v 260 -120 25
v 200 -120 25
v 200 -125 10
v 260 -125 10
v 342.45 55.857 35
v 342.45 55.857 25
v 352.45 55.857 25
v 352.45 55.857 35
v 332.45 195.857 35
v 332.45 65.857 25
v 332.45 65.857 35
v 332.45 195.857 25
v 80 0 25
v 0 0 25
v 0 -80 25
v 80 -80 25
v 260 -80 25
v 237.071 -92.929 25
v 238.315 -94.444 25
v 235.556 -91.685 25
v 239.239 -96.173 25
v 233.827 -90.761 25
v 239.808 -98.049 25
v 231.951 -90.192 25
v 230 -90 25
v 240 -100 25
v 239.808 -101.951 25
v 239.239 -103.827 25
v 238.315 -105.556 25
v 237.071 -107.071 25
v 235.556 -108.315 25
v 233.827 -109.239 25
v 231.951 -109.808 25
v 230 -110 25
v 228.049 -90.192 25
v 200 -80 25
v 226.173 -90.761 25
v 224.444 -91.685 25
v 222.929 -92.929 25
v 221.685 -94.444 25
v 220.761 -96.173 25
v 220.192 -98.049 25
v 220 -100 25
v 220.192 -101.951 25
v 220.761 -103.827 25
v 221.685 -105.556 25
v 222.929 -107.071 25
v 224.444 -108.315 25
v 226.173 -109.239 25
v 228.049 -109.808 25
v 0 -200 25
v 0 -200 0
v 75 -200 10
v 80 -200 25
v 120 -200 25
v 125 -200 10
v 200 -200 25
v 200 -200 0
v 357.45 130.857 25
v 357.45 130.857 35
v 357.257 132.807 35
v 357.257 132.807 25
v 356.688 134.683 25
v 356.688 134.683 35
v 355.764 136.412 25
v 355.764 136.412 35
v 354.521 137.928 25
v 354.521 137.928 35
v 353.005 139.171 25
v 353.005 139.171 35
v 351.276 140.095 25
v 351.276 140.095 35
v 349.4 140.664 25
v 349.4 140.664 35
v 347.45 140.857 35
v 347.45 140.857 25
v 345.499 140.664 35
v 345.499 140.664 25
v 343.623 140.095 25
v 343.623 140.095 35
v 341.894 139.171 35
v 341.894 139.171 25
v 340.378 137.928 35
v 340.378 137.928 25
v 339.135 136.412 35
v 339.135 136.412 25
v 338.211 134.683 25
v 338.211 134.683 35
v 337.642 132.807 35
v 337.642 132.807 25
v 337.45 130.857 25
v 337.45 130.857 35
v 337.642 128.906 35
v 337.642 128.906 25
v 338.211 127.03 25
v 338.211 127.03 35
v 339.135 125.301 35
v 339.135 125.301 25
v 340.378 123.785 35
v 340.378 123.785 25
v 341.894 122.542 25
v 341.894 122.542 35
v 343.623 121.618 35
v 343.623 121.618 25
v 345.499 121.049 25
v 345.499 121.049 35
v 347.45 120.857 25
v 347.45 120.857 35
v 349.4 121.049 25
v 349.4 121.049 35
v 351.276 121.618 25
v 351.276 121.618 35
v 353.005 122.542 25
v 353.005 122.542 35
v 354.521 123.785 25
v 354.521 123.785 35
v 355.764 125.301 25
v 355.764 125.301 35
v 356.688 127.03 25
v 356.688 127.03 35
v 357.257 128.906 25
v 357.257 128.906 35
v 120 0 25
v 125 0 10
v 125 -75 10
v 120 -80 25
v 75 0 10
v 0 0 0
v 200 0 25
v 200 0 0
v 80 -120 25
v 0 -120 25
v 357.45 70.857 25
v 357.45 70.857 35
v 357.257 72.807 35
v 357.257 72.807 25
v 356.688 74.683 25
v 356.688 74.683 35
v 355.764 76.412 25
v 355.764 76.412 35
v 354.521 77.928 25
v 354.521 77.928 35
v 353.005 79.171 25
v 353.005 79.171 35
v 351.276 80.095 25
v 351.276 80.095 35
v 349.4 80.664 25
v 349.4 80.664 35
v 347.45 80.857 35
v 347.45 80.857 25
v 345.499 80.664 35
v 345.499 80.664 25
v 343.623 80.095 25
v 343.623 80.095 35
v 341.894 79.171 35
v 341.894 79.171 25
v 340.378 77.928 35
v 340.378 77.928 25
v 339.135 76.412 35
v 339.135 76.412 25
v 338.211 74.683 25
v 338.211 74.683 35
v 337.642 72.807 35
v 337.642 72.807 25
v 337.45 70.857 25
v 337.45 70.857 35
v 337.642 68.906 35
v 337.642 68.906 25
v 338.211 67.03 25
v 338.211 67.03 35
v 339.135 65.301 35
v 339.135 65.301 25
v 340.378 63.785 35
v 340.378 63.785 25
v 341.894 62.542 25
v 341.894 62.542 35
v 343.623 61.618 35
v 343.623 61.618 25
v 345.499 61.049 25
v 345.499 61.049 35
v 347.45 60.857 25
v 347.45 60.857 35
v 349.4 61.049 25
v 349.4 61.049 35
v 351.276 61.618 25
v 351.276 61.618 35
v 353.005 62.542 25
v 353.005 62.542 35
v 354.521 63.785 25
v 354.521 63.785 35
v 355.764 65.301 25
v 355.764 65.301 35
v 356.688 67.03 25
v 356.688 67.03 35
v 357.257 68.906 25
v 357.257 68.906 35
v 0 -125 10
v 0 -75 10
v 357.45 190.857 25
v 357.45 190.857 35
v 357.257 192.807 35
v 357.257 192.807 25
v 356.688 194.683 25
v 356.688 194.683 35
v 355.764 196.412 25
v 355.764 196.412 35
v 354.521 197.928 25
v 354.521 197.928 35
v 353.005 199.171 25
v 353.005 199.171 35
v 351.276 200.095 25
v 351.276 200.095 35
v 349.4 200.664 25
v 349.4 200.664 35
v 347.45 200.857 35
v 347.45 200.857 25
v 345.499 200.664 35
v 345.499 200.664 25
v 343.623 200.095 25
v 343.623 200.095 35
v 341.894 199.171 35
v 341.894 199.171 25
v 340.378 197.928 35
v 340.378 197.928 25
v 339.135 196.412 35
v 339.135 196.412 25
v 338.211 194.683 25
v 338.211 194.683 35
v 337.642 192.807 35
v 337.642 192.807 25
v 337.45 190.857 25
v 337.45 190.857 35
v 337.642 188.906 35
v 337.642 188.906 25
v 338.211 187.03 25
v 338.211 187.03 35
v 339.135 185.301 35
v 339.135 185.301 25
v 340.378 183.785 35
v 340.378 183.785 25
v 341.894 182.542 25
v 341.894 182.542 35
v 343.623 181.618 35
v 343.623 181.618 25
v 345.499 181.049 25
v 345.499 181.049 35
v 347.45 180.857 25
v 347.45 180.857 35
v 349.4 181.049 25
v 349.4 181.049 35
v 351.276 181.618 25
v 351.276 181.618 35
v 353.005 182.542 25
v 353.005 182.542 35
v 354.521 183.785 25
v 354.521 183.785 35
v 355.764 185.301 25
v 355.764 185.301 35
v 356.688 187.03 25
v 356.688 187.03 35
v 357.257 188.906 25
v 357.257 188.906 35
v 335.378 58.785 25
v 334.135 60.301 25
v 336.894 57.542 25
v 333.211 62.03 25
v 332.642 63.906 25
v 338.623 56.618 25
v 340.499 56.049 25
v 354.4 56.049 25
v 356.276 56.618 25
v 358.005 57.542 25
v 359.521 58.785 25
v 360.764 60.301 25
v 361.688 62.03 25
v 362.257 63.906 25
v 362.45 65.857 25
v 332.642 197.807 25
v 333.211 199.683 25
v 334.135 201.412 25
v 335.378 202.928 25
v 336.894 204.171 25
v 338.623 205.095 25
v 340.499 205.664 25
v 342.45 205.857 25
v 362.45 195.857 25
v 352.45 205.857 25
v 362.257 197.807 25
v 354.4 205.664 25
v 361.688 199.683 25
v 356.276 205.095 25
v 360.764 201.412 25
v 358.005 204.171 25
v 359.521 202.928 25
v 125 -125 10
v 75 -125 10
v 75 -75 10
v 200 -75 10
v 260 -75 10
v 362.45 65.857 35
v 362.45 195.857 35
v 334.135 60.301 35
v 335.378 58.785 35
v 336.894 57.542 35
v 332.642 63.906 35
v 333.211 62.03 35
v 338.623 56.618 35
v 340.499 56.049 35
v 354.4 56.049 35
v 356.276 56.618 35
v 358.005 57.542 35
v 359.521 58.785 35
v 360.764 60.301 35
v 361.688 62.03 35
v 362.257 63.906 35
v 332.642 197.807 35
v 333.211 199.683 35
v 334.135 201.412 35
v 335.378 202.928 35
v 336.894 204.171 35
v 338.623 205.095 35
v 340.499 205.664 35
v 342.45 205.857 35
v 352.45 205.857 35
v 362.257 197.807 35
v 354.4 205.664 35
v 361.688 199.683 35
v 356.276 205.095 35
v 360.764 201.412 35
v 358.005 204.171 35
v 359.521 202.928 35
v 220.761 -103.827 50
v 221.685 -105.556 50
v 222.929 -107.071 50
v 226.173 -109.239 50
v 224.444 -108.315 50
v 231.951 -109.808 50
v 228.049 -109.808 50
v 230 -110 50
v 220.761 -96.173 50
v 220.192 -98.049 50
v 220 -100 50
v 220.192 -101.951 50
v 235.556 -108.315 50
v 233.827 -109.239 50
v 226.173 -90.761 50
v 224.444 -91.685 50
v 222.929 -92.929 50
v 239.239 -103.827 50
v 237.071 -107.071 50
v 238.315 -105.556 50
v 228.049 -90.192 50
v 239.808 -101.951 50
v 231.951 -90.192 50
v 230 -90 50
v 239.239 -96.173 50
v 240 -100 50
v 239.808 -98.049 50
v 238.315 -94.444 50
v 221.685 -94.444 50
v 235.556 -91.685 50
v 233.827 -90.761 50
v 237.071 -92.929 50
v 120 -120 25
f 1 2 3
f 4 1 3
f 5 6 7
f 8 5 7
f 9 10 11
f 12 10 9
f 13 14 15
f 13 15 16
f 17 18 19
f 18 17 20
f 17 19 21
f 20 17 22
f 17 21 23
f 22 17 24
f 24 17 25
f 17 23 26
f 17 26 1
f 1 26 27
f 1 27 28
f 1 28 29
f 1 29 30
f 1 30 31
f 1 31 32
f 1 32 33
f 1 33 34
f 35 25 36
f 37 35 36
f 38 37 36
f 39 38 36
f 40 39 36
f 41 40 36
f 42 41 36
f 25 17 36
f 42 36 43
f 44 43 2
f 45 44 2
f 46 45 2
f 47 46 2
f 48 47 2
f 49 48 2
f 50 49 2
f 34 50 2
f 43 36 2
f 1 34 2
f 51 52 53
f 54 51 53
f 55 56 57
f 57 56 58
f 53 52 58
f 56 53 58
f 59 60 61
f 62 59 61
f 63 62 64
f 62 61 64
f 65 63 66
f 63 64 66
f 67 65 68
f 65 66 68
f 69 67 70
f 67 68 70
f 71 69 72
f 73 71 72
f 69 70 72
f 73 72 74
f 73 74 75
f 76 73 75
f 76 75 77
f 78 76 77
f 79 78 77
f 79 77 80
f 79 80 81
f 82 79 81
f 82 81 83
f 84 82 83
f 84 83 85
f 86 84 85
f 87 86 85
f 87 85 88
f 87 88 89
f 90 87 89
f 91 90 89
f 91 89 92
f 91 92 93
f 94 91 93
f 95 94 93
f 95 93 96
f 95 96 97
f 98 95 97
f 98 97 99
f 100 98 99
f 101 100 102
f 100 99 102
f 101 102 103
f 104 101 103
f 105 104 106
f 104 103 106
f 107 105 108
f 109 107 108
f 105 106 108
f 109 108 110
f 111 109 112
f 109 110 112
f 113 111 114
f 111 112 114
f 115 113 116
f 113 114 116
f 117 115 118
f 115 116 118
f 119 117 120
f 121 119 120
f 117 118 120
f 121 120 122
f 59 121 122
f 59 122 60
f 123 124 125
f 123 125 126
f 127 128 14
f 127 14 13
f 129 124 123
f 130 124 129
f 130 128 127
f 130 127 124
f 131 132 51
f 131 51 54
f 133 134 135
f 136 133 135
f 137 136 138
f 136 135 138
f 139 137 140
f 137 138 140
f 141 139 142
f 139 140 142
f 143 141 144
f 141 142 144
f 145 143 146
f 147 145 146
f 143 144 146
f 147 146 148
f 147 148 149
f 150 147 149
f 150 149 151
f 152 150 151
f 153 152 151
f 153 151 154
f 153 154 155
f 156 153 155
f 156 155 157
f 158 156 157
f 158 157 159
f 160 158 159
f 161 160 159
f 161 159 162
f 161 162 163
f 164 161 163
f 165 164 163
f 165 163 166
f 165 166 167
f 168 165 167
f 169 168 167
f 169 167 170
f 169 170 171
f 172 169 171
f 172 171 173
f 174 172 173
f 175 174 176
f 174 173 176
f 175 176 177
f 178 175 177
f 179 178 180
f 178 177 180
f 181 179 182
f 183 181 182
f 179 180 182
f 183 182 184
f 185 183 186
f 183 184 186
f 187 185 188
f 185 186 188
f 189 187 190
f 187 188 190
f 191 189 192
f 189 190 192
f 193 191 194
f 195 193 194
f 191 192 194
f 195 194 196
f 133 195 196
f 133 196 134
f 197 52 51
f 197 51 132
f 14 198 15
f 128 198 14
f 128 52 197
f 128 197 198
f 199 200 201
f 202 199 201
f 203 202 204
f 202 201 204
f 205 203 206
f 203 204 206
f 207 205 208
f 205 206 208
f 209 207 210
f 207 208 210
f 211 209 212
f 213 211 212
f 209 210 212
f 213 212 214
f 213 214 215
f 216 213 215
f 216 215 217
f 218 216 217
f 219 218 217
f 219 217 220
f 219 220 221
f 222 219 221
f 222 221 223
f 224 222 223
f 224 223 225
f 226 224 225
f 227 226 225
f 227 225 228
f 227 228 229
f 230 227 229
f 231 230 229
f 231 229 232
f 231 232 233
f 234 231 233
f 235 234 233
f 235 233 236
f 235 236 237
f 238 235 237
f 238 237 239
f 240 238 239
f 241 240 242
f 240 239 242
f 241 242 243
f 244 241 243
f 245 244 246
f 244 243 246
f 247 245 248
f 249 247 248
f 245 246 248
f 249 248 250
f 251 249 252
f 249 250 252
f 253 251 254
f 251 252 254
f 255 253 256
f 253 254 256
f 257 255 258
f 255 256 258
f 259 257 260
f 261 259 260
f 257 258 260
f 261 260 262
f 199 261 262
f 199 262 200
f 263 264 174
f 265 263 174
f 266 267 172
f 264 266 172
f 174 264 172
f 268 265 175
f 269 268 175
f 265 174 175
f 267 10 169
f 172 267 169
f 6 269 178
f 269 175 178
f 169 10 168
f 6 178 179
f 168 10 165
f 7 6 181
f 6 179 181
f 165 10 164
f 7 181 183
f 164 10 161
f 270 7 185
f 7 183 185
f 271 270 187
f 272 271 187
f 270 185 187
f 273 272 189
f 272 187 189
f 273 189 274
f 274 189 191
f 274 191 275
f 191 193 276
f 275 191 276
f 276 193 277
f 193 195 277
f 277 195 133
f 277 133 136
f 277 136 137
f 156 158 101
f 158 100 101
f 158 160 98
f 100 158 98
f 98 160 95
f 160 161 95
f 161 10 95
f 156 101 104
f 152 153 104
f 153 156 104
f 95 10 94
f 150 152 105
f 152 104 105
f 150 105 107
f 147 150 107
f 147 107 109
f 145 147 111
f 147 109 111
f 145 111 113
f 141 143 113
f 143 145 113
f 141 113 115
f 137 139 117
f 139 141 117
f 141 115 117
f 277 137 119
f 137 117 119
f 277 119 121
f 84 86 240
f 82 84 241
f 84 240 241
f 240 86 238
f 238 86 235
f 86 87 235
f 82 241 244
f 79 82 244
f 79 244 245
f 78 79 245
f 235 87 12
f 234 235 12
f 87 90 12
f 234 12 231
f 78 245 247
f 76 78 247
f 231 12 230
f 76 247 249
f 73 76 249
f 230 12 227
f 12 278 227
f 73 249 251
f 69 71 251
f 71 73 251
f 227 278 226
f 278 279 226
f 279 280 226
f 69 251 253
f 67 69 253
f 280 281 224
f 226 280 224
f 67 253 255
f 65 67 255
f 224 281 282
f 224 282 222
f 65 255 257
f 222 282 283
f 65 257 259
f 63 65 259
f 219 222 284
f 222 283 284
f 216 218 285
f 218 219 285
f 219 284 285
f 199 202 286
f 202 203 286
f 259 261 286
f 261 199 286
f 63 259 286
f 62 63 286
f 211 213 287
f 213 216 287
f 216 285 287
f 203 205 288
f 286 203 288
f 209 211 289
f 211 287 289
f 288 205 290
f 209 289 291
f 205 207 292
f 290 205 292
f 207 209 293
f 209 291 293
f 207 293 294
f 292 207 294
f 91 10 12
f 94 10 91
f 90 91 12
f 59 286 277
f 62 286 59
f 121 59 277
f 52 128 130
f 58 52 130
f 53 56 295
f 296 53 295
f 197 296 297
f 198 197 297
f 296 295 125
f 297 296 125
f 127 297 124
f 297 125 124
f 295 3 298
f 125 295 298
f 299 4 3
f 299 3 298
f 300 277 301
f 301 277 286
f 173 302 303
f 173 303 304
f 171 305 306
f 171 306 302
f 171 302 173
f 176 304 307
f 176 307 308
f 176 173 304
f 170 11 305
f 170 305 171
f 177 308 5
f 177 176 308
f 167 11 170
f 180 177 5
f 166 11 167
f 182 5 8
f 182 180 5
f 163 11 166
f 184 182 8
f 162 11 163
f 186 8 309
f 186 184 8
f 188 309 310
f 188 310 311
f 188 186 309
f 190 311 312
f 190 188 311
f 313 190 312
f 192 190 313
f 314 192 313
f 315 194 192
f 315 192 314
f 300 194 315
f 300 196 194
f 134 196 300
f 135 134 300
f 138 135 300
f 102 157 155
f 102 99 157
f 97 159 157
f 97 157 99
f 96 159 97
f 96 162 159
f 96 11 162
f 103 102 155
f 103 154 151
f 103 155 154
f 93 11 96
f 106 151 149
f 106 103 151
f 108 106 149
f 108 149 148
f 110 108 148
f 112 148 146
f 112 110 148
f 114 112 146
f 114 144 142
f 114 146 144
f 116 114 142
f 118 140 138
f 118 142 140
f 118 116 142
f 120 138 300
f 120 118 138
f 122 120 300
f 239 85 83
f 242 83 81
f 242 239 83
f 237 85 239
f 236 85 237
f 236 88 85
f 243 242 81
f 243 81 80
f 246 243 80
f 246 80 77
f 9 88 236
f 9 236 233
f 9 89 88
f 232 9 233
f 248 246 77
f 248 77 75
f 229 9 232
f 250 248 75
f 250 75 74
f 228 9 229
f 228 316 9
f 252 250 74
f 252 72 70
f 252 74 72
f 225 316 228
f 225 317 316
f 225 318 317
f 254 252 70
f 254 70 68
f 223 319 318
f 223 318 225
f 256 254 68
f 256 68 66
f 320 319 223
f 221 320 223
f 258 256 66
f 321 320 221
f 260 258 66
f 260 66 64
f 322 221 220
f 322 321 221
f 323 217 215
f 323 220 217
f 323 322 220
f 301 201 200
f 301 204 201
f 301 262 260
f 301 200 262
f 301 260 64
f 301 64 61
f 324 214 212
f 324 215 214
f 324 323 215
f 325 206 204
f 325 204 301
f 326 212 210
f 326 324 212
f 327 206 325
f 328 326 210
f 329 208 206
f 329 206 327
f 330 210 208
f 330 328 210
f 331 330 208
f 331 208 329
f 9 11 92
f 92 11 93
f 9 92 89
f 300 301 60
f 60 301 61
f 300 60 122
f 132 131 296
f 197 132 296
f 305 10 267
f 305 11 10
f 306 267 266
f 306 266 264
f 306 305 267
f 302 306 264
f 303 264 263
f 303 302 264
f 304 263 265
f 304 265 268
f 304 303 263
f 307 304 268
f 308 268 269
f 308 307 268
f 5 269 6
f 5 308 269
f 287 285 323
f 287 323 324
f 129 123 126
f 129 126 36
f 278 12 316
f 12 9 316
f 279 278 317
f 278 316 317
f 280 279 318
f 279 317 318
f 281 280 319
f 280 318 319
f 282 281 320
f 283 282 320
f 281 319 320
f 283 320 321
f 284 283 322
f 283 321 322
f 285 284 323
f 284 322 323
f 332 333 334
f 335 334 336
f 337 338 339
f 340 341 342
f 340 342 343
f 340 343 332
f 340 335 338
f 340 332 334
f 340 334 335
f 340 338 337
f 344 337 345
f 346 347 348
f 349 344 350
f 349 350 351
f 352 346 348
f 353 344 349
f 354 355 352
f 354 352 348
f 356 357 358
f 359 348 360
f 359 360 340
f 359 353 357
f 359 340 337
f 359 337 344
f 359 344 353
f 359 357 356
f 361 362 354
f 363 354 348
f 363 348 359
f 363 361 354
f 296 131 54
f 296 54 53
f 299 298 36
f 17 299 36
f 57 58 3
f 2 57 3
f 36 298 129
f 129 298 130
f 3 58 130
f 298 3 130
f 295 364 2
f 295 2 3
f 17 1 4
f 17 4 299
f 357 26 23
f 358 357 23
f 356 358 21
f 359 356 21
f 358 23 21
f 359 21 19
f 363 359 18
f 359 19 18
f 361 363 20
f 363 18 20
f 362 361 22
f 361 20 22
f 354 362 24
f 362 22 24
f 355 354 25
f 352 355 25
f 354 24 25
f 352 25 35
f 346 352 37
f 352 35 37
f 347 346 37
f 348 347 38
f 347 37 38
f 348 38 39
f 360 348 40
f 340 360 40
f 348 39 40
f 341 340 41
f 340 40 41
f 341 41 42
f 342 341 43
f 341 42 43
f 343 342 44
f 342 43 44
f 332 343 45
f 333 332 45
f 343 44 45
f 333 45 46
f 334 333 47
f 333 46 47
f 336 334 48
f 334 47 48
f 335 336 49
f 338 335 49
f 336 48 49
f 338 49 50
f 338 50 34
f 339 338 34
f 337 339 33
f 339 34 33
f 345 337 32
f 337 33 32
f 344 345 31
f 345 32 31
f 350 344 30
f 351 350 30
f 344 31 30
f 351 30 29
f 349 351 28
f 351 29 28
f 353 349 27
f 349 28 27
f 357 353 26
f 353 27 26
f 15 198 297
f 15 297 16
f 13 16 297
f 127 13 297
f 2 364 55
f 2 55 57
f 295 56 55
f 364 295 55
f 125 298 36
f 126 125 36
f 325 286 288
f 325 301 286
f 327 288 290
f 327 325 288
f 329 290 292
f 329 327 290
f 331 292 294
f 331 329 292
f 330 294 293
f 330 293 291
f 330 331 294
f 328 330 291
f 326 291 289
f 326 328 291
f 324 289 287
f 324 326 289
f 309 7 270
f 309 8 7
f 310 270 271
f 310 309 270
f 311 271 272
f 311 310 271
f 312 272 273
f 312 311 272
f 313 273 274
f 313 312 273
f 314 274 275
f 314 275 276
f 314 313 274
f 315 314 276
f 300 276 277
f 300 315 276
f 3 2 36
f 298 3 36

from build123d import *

# Parameters (mm, degrees)
F0_W      = 200
F0_H      = 200
F1_DEPTH  = 25
F3_DEPTH  = 200.001
F5_DEPTH  = 200.001
F6_DEPTH  = 60
F7_R      = 10
F8_DEPTH  = 25
F9_W      = 30
F9_H      = 150
F10_DEPTH = 10
F11_R     = 10
F13_R     = 10
F14_DEPTH = 35.001


with BuildPart() as f1:
    # F0 (on Top) → F1 (new body)
    with BuildSketch(Plane.XY):
        with Locations((100, -100)):
            Rectangle(F0_W, F0_H)
    extrude(amount=F1_DEPTH)

    # F2 (on face) → F3 (cut, through all)
    with BuildSketch(Plane.XZ.offset(200)):
        Polygon((120, 25), (80, 25), (75, 10), (125, 10), align=None)
    extrude(amount=-F3_DEPTH, mode=Mode.SUBTRACT)

    # F4 (on face) → F5 (cut, through all)
    with BuildSketch(Plane.YZ.offset(200)):
        Polygon((-80, 25), (-120, 25), (-125, 10), (-75, 10), align=None)
    extrude(amount=-F5_DEPTH, mode=Mode.SUBTRACT)


with BuildPart() as f6:
    # F4 (on face) → F6 (new body)
    with BuildSketch(Plane.YZ.offset(200)):
        Polygon((-80, 25), (-120, 25), (-125, 10), (-75, 10), align=None)
    extrude(amount=F6_DEPTH)

    # F7 (on face) → F8 (join)
    with BuildSketch(Plane.XY.offset(25)):
        with Locations((230, -100)):
            Circle(F7_R)
    extrude(amount=F8_DEPTH)


with BuildPart() as f10:
    # F9 (on face) → F10 (new body)
    with BuildSketch(Plane.XY.offset(25)):
        with Locations((347.449511, 130.856555)):
            Rectangle(F9_W, F9_H)
    extrude(amount=F10_DEPTH)

    # F11
    f11_edges = [f10.edges().sort_by_distance(p)[0] for p in [
        (362.449511, 55.856555, 30),
        (362.449511, 205.856555, 30),
        (332.449511, 205.856555, 30),
        (332.449511, 55.856555, 30),
    ]]
    fillet(f11_edges, radius=F11_R)

    # F13 (on face) → F14 (cut, through all)
    with BuildSketch(Plane.XY.offset(35)):
        with Locations((347.449511, 70.856555)):
            Circle(F13_R)
        with Locations((347.449511, 130.856555)):
            Circle(F13_R)
        with Locations((347.449511, 190.856555)):
            Circle(F13_R)
    extrude(amount=-F14_DEPTH, mode=Mode.SUBTRACT)


solid = Compound([f1.part, f6.part, f10.part])
